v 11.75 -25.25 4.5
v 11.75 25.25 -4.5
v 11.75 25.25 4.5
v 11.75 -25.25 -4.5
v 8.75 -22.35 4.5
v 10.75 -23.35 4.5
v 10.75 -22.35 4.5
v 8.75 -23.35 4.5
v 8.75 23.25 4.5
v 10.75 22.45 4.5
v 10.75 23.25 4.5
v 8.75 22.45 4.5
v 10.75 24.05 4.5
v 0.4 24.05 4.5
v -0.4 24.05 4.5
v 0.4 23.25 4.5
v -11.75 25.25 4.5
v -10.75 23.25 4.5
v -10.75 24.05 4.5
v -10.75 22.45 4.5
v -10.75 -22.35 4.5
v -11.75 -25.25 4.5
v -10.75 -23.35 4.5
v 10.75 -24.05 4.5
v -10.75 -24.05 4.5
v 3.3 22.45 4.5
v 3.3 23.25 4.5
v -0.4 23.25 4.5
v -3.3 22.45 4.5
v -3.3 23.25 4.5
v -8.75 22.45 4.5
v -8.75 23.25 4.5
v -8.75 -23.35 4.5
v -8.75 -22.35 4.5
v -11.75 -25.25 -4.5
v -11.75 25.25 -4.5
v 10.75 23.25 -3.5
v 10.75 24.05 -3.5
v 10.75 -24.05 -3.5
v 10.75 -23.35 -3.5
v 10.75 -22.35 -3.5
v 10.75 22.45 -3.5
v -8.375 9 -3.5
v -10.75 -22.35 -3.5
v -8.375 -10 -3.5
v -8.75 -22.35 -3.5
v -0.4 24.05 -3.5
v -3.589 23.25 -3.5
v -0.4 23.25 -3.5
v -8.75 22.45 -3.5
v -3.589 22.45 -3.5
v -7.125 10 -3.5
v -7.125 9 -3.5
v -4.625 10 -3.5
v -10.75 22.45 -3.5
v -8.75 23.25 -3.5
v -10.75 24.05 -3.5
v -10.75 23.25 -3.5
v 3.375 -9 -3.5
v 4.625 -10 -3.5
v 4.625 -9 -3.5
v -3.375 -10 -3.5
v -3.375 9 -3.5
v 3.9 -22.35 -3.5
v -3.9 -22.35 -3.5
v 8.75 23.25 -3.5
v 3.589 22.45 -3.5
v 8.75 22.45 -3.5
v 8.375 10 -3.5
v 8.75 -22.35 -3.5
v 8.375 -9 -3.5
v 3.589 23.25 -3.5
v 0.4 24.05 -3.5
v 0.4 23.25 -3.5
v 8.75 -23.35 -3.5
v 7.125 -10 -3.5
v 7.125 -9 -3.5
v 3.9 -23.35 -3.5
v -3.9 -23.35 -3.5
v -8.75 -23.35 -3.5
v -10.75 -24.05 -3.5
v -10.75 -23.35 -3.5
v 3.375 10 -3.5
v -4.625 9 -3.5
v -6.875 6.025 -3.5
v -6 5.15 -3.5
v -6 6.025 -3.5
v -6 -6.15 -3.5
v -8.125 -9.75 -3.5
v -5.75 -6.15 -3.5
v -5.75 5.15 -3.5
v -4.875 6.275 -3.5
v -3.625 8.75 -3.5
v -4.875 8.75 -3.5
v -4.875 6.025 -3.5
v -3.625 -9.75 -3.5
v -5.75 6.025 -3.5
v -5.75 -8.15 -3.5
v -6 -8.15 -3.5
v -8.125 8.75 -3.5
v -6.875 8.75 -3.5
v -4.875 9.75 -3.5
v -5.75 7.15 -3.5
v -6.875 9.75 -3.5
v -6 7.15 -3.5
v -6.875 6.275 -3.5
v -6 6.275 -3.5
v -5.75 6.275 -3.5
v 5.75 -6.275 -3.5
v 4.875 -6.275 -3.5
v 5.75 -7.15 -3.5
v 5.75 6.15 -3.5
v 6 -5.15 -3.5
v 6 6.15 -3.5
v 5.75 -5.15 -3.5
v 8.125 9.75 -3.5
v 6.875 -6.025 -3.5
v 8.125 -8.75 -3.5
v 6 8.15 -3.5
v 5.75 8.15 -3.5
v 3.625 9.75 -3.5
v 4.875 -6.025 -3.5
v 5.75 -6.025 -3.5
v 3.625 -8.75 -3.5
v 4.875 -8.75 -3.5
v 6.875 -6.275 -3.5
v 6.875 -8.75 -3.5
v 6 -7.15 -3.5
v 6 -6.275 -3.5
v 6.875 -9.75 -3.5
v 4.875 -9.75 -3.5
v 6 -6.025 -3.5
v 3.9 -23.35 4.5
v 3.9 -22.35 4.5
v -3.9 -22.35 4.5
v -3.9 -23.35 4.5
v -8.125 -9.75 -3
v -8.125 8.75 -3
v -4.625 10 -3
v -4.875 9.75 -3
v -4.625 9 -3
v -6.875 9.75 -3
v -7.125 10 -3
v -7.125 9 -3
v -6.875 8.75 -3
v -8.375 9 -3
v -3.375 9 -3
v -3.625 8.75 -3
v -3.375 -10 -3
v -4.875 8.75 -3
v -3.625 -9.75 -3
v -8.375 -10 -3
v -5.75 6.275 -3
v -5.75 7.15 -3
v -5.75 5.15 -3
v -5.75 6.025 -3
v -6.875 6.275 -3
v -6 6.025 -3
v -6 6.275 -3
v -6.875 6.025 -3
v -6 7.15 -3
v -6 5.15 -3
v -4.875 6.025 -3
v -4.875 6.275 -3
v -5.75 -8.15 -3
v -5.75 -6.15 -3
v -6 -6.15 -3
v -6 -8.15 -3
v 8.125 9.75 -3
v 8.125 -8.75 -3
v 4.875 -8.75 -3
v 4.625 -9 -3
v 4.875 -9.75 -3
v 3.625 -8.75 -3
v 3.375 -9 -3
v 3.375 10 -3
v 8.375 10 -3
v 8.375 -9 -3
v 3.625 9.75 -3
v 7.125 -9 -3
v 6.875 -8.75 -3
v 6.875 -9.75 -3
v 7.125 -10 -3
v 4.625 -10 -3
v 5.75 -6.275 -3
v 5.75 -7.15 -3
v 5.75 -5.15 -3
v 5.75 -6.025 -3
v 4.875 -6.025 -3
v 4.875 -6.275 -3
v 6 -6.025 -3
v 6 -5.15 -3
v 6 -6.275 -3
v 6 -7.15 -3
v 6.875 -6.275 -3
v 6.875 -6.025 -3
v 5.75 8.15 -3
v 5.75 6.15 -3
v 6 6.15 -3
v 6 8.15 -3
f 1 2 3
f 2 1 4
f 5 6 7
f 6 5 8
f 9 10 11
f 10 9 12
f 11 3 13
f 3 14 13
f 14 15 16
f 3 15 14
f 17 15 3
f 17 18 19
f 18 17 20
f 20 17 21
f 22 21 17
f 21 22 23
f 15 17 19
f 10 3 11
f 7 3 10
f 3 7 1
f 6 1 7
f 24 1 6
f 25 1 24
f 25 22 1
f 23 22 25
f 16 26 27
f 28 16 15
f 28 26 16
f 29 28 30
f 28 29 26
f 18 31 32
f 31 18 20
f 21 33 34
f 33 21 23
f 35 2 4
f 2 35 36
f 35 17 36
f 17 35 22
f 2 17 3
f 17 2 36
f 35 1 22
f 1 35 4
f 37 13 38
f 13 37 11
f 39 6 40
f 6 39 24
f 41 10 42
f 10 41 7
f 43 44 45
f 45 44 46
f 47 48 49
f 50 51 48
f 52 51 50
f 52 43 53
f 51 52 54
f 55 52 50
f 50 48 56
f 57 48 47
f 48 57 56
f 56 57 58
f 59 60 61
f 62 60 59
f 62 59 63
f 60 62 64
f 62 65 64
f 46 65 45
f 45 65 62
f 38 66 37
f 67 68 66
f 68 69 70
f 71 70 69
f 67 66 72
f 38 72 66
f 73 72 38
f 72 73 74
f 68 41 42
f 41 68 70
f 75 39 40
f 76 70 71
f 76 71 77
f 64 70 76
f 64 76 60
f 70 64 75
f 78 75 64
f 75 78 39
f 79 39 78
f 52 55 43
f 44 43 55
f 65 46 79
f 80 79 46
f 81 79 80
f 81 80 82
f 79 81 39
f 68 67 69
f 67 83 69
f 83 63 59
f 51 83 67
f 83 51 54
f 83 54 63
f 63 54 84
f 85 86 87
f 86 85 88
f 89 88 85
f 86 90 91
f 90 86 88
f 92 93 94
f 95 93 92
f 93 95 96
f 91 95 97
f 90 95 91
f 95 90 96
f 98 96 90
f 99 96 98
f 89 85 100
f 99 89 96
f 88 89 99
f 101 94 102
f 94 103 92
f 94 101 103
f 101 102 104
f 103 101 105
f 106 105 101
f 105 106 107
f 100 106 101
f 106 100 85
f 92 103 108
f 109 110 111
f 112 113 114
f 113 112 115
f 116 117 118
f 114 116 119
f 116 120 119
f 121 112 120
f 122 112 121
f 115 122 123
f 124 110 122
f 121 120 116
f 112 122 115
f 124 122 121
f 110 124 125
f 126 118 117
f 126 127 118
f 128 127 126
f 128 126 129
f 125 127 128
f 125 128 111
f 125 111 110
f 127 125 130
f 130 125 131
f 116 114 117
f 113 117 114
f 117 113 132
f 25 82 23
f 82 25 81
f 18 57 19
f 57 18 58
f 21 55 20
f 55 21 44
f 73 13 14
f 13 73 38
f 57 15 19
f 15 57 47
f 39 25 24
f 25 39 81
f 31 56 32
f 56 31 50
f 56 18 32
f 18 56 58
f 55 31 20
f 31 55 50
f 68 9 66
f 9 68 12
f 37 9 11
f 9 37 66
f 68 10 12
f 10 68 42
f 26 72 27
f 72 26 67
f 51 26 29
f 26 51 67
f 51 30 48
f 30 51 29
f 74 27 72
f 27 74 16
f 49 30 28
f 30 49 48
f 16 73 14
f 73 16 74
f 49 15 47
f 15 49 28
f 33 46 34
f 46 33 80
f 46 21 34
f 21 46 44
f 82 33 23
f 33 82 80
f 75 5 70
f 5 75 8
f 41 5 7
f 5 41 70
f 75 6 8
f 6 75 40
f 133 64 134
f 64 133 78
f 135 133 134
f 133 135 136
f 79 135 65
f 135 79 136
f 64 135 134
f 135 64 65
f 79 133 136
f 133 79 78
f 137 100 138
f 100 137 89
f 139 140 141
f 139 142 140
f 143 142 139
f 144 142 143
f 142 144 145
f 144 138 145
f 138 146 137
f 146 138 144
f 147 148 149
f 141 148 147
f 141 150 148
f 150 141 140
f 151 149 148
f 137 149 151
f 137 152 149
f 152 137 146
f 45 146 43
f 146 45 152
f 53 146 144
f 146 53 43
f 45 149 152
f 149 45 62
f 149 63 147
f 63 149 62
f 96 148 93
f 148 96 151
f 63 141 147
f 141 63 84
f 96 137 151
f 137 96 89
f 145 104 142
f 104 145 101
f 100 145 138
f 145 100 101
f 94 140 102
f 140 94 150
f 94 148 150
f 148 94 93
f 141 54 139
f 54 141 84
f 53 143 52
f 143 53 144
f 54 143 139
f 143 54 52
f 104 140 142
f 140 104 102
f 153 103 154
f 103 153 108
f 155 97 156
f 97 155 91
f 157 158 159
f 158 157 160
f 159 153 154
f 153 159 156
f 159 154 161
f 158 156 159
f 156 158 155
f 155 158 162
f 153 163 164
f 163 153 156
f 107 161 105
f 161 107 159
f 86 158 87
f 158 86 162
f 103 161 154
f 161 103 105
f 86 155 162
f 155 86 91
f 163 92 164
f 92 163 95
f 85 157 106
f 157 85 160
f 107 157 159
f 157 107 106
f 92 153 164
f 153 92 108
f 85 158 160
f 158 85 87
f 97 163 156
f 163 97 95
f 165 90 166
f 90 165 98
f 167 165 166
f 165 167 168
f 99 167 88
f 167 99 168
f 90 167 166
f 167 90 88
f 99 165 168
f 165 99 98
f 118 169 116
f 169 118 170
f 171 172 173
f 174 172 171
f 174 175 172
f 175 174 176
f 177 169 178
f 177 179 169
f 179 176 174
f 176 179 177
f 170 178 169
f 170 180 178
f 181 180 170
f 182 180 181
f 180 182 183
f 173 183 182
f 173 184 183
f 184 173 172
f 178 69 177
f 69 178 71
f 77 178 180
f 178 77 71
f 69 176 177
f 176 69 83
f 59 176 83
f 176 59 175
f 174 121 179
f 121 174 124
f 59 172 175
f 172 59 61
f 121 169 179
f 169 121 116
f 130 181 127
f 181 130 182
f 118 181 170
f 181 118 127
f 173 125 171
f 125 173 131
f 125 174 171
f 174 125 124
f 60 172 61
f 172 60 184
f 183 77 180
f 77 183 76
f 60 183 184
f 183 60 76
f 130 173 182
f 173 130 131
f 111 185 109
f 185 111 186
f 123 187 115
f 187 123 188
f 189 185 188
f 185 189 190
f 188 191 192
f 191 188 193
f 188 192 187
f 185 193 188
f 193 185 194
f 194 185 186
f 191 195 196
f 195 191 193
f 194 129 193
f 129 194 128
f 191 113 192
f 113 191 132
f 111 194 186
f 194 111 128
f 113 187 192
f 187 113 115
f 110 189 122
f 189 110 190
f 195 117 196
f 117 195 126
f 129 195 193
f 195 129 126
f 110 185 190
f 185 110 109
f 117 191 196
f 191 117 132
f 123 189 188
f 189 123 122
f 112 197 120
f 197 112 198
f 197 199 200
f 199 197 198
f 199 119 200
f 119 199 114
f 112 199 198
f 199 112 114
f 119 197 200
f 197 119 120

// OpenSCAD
// file: RemoteControlModules.scad
$fn = 100;

//////////////// Internal Modules ////////////////

module round_case(xx, yy, zz, d, cw) {
    difference () {
        minkowski() {
            cube([xx - 2*d, yy - 2*d, zz], center = true);
            sphere(d/2);
        }

        // chopp off top
        translate([0, 0, zz]) cube([xx + 1, yy + 1, zz], center = true);

        // hollow inside
       translate([0,0,d]) {
           minkowski() {
               cube([xx - 2*cw - 2*d, yy - 2*cw - 2*d, zz - 2*cw + 2*d], center = true);
               sphere(d/2);
           }
       }
    }
}

module mid_notch(h, t = 0.8) {
    w1 = 6.6;
    w2 = 7.25;
    
    translate([0, t/2, 0]) {
        rotate([90, 0, 0]) {
            linear_extrude(t) {
                polygon(points = [[-w2/2, -h/2], [w2/2, -h/2], [w1/2, h/2], [-w1/2, h/2]]);
            }
        }
    }
}

module bat_sign(w = 5, l = 20, h = 1) {
    // width of the battery
    //w = 5;
    // width of the shoulder on plus pole
    w2 = 2;
    // width of the plus pole
    w3 = (w - w2)/2;
    // thickness of the sign
    t = 0.25;
    // height of the plus pole
    h2 = 1;
    // height of the +/- symbols
    h3 = 2;
    // height of the battery
    bl = l - h2;
    // position of + sign, in percentage of the height of battery
    p1 = 0.85;
    // position of - sign, in percentage of the height of battery
    p2 = (1 - p1);

    // Left side
    translate([0, 0, 0])
        cube([t, bl, h], center = false);
    // right side
    translate([w - t, 0, 0])
        cube([t, bl, h], center = false);
    // bottom side
    translate([0, 0, 0])
        cube([w, t, h], center = false);
    // upper left shoulder
    translate([0, bl - t, 0])
        cube([w3, t, h], center = false);
    // upper right shoulder
    translate([w - w3, bl - t, 0])
        cube([w3, t, h], center = false);
    // upper plus pole
    translate([w3 - t, bl - t + h2, 0])
        cube([w2 + 2*t, t, h], center = false);
    // left plus pole
    translate([w3 - t, bl - t, 0])
        cube([t, h2 + t, h], center = false);
    // right plus pole
    translate([w2 + w3, bl - t, 0])
        cube([t, h2 + t, h], center = false);

    // Plus sign
    translate([(w - t)/2, bl * p1 - h3/2, 0])
        cube([t, h3, h]);
    translate([(w - h3)/2, bl * p1 - t/2, 0])
        cube([h3, t, h]);

    // Minus sign
    translate([(w - t)/2, bl * p2 - h3/2, 0])
        cube([t, h3, h]);
}

//////////////// Internal Modules ////////////////

module RemoteControlBottom(w, l, h, d, cw, lw, lh) {
    difference() {
        round_case(w, l, h, d, cw);
        // cut out ledge
        translate([0, 0, h/2 - lh]) {
            linear_extrude(lh + 1) {
                minkowski() {
                    square([w - 2*lw - 2*d, l - 2*lw - 2*d], center = true);
                    circle(d/2);
                }
            }
        }
    }
}

module RemoteControlTop(w, l, h, d, cw, lw, lh) {
    round_case(w, l, h, d, cw);
    // add ledge
    difference() {
        translate([0, 0, h/2 - 1]) {
            linear_extrude(lh + 1) {
                minkowski() {
                    square([w - 2*(cw - lw) - 2*d, l - 2*(cw - lw) - 2*d], center = true);
                    circle(d/2);
                }
            }
        }

        // hollow inside
        translate([0, 0, h/2 - 2]) {
            linear_extrude(lh + 3) {
                minkowski() {
                    square([w - 2*cw - 2*d, l - 2*cw - 2*d], center = true);
                    circle(d/2);
                }
            }
        }
    }
}

module BatteryPack() {
    // width
    w = 23.5;
    // length
    l = 50.5;
    // height
    h = 9;
    // thickness
    t = 1;
    // thickness #2
    t2 = 1.2;
    // thickness #3
    t3 = 0.8;
    // width #2
    w2 = 3;
    // width #3
    w3 = 6.6;
    // width #4
    w4 = 7.8;
    // contact gap
    cg = 0.8;

    difference() {
        cube([w, l, h], center = true);
        translate([0, 0, t]) {
            cube([w - 2*t, l - 2*t2, h], center = true);
        }
    }

    union() {
        // upper left contact notch
        translate([-(w - w2)/2, l/2 - t3/2 - t2 - cg, 0]) {
            cube([w2, t3, h], center = true);
        }

        // upper right contact notch
        translate([(w - w2)/2, l/2 - t3/2 - t2 - cg, 0]) {
            cube([w2, t3, h], center = true);
        }

        // upper middle contact notch
        translate([0, l/2 - t3/2 - t2 - cg, 0]) {
            mid_notch(h, t3);
        }
        // temp variable
        _lt = t2 + cg + t3;
        translate([0, l/2 - _lt/2, 0]) {
            cube([t3, _lt, h], center = true);
        }
    }

    union() {
        // lower left contact notch
        translate([-(w - w2)/2, -(l/2 - t3/2 - t2 - cg), 0]) {
            cube([w2, t, h], center = true);
        }

        // lower right contact notch
        translate([(w - w2)/2, -(l/2 - t3/2 - t2 - cg), 0]) {
            cube([w2, t, h], center = true);
        }

        // lower middle contact notch
        translate([0, -(l/2 - t3/2 - t2 - cg), 0]) {
            cube([w4, t, h], center = true);
        }
    }

    bw = 5;
    bl = 20;
    bh = 1;

    // Battery sign #1
    translate([-w/4 - bw/2 , -bl/2, -h/2 + bh/2])
        bat_sign(bw, bl);

    // Battery sign #2
    translate([w/4 + bw/2 , bl/2, -h/2 + bh/2])
        rotate([0, 0, 180])
            bat_sign(bw, bl);
}
// main file
include <RemoteControlModules.scad>

BatteryPack();
//bat_sign();
